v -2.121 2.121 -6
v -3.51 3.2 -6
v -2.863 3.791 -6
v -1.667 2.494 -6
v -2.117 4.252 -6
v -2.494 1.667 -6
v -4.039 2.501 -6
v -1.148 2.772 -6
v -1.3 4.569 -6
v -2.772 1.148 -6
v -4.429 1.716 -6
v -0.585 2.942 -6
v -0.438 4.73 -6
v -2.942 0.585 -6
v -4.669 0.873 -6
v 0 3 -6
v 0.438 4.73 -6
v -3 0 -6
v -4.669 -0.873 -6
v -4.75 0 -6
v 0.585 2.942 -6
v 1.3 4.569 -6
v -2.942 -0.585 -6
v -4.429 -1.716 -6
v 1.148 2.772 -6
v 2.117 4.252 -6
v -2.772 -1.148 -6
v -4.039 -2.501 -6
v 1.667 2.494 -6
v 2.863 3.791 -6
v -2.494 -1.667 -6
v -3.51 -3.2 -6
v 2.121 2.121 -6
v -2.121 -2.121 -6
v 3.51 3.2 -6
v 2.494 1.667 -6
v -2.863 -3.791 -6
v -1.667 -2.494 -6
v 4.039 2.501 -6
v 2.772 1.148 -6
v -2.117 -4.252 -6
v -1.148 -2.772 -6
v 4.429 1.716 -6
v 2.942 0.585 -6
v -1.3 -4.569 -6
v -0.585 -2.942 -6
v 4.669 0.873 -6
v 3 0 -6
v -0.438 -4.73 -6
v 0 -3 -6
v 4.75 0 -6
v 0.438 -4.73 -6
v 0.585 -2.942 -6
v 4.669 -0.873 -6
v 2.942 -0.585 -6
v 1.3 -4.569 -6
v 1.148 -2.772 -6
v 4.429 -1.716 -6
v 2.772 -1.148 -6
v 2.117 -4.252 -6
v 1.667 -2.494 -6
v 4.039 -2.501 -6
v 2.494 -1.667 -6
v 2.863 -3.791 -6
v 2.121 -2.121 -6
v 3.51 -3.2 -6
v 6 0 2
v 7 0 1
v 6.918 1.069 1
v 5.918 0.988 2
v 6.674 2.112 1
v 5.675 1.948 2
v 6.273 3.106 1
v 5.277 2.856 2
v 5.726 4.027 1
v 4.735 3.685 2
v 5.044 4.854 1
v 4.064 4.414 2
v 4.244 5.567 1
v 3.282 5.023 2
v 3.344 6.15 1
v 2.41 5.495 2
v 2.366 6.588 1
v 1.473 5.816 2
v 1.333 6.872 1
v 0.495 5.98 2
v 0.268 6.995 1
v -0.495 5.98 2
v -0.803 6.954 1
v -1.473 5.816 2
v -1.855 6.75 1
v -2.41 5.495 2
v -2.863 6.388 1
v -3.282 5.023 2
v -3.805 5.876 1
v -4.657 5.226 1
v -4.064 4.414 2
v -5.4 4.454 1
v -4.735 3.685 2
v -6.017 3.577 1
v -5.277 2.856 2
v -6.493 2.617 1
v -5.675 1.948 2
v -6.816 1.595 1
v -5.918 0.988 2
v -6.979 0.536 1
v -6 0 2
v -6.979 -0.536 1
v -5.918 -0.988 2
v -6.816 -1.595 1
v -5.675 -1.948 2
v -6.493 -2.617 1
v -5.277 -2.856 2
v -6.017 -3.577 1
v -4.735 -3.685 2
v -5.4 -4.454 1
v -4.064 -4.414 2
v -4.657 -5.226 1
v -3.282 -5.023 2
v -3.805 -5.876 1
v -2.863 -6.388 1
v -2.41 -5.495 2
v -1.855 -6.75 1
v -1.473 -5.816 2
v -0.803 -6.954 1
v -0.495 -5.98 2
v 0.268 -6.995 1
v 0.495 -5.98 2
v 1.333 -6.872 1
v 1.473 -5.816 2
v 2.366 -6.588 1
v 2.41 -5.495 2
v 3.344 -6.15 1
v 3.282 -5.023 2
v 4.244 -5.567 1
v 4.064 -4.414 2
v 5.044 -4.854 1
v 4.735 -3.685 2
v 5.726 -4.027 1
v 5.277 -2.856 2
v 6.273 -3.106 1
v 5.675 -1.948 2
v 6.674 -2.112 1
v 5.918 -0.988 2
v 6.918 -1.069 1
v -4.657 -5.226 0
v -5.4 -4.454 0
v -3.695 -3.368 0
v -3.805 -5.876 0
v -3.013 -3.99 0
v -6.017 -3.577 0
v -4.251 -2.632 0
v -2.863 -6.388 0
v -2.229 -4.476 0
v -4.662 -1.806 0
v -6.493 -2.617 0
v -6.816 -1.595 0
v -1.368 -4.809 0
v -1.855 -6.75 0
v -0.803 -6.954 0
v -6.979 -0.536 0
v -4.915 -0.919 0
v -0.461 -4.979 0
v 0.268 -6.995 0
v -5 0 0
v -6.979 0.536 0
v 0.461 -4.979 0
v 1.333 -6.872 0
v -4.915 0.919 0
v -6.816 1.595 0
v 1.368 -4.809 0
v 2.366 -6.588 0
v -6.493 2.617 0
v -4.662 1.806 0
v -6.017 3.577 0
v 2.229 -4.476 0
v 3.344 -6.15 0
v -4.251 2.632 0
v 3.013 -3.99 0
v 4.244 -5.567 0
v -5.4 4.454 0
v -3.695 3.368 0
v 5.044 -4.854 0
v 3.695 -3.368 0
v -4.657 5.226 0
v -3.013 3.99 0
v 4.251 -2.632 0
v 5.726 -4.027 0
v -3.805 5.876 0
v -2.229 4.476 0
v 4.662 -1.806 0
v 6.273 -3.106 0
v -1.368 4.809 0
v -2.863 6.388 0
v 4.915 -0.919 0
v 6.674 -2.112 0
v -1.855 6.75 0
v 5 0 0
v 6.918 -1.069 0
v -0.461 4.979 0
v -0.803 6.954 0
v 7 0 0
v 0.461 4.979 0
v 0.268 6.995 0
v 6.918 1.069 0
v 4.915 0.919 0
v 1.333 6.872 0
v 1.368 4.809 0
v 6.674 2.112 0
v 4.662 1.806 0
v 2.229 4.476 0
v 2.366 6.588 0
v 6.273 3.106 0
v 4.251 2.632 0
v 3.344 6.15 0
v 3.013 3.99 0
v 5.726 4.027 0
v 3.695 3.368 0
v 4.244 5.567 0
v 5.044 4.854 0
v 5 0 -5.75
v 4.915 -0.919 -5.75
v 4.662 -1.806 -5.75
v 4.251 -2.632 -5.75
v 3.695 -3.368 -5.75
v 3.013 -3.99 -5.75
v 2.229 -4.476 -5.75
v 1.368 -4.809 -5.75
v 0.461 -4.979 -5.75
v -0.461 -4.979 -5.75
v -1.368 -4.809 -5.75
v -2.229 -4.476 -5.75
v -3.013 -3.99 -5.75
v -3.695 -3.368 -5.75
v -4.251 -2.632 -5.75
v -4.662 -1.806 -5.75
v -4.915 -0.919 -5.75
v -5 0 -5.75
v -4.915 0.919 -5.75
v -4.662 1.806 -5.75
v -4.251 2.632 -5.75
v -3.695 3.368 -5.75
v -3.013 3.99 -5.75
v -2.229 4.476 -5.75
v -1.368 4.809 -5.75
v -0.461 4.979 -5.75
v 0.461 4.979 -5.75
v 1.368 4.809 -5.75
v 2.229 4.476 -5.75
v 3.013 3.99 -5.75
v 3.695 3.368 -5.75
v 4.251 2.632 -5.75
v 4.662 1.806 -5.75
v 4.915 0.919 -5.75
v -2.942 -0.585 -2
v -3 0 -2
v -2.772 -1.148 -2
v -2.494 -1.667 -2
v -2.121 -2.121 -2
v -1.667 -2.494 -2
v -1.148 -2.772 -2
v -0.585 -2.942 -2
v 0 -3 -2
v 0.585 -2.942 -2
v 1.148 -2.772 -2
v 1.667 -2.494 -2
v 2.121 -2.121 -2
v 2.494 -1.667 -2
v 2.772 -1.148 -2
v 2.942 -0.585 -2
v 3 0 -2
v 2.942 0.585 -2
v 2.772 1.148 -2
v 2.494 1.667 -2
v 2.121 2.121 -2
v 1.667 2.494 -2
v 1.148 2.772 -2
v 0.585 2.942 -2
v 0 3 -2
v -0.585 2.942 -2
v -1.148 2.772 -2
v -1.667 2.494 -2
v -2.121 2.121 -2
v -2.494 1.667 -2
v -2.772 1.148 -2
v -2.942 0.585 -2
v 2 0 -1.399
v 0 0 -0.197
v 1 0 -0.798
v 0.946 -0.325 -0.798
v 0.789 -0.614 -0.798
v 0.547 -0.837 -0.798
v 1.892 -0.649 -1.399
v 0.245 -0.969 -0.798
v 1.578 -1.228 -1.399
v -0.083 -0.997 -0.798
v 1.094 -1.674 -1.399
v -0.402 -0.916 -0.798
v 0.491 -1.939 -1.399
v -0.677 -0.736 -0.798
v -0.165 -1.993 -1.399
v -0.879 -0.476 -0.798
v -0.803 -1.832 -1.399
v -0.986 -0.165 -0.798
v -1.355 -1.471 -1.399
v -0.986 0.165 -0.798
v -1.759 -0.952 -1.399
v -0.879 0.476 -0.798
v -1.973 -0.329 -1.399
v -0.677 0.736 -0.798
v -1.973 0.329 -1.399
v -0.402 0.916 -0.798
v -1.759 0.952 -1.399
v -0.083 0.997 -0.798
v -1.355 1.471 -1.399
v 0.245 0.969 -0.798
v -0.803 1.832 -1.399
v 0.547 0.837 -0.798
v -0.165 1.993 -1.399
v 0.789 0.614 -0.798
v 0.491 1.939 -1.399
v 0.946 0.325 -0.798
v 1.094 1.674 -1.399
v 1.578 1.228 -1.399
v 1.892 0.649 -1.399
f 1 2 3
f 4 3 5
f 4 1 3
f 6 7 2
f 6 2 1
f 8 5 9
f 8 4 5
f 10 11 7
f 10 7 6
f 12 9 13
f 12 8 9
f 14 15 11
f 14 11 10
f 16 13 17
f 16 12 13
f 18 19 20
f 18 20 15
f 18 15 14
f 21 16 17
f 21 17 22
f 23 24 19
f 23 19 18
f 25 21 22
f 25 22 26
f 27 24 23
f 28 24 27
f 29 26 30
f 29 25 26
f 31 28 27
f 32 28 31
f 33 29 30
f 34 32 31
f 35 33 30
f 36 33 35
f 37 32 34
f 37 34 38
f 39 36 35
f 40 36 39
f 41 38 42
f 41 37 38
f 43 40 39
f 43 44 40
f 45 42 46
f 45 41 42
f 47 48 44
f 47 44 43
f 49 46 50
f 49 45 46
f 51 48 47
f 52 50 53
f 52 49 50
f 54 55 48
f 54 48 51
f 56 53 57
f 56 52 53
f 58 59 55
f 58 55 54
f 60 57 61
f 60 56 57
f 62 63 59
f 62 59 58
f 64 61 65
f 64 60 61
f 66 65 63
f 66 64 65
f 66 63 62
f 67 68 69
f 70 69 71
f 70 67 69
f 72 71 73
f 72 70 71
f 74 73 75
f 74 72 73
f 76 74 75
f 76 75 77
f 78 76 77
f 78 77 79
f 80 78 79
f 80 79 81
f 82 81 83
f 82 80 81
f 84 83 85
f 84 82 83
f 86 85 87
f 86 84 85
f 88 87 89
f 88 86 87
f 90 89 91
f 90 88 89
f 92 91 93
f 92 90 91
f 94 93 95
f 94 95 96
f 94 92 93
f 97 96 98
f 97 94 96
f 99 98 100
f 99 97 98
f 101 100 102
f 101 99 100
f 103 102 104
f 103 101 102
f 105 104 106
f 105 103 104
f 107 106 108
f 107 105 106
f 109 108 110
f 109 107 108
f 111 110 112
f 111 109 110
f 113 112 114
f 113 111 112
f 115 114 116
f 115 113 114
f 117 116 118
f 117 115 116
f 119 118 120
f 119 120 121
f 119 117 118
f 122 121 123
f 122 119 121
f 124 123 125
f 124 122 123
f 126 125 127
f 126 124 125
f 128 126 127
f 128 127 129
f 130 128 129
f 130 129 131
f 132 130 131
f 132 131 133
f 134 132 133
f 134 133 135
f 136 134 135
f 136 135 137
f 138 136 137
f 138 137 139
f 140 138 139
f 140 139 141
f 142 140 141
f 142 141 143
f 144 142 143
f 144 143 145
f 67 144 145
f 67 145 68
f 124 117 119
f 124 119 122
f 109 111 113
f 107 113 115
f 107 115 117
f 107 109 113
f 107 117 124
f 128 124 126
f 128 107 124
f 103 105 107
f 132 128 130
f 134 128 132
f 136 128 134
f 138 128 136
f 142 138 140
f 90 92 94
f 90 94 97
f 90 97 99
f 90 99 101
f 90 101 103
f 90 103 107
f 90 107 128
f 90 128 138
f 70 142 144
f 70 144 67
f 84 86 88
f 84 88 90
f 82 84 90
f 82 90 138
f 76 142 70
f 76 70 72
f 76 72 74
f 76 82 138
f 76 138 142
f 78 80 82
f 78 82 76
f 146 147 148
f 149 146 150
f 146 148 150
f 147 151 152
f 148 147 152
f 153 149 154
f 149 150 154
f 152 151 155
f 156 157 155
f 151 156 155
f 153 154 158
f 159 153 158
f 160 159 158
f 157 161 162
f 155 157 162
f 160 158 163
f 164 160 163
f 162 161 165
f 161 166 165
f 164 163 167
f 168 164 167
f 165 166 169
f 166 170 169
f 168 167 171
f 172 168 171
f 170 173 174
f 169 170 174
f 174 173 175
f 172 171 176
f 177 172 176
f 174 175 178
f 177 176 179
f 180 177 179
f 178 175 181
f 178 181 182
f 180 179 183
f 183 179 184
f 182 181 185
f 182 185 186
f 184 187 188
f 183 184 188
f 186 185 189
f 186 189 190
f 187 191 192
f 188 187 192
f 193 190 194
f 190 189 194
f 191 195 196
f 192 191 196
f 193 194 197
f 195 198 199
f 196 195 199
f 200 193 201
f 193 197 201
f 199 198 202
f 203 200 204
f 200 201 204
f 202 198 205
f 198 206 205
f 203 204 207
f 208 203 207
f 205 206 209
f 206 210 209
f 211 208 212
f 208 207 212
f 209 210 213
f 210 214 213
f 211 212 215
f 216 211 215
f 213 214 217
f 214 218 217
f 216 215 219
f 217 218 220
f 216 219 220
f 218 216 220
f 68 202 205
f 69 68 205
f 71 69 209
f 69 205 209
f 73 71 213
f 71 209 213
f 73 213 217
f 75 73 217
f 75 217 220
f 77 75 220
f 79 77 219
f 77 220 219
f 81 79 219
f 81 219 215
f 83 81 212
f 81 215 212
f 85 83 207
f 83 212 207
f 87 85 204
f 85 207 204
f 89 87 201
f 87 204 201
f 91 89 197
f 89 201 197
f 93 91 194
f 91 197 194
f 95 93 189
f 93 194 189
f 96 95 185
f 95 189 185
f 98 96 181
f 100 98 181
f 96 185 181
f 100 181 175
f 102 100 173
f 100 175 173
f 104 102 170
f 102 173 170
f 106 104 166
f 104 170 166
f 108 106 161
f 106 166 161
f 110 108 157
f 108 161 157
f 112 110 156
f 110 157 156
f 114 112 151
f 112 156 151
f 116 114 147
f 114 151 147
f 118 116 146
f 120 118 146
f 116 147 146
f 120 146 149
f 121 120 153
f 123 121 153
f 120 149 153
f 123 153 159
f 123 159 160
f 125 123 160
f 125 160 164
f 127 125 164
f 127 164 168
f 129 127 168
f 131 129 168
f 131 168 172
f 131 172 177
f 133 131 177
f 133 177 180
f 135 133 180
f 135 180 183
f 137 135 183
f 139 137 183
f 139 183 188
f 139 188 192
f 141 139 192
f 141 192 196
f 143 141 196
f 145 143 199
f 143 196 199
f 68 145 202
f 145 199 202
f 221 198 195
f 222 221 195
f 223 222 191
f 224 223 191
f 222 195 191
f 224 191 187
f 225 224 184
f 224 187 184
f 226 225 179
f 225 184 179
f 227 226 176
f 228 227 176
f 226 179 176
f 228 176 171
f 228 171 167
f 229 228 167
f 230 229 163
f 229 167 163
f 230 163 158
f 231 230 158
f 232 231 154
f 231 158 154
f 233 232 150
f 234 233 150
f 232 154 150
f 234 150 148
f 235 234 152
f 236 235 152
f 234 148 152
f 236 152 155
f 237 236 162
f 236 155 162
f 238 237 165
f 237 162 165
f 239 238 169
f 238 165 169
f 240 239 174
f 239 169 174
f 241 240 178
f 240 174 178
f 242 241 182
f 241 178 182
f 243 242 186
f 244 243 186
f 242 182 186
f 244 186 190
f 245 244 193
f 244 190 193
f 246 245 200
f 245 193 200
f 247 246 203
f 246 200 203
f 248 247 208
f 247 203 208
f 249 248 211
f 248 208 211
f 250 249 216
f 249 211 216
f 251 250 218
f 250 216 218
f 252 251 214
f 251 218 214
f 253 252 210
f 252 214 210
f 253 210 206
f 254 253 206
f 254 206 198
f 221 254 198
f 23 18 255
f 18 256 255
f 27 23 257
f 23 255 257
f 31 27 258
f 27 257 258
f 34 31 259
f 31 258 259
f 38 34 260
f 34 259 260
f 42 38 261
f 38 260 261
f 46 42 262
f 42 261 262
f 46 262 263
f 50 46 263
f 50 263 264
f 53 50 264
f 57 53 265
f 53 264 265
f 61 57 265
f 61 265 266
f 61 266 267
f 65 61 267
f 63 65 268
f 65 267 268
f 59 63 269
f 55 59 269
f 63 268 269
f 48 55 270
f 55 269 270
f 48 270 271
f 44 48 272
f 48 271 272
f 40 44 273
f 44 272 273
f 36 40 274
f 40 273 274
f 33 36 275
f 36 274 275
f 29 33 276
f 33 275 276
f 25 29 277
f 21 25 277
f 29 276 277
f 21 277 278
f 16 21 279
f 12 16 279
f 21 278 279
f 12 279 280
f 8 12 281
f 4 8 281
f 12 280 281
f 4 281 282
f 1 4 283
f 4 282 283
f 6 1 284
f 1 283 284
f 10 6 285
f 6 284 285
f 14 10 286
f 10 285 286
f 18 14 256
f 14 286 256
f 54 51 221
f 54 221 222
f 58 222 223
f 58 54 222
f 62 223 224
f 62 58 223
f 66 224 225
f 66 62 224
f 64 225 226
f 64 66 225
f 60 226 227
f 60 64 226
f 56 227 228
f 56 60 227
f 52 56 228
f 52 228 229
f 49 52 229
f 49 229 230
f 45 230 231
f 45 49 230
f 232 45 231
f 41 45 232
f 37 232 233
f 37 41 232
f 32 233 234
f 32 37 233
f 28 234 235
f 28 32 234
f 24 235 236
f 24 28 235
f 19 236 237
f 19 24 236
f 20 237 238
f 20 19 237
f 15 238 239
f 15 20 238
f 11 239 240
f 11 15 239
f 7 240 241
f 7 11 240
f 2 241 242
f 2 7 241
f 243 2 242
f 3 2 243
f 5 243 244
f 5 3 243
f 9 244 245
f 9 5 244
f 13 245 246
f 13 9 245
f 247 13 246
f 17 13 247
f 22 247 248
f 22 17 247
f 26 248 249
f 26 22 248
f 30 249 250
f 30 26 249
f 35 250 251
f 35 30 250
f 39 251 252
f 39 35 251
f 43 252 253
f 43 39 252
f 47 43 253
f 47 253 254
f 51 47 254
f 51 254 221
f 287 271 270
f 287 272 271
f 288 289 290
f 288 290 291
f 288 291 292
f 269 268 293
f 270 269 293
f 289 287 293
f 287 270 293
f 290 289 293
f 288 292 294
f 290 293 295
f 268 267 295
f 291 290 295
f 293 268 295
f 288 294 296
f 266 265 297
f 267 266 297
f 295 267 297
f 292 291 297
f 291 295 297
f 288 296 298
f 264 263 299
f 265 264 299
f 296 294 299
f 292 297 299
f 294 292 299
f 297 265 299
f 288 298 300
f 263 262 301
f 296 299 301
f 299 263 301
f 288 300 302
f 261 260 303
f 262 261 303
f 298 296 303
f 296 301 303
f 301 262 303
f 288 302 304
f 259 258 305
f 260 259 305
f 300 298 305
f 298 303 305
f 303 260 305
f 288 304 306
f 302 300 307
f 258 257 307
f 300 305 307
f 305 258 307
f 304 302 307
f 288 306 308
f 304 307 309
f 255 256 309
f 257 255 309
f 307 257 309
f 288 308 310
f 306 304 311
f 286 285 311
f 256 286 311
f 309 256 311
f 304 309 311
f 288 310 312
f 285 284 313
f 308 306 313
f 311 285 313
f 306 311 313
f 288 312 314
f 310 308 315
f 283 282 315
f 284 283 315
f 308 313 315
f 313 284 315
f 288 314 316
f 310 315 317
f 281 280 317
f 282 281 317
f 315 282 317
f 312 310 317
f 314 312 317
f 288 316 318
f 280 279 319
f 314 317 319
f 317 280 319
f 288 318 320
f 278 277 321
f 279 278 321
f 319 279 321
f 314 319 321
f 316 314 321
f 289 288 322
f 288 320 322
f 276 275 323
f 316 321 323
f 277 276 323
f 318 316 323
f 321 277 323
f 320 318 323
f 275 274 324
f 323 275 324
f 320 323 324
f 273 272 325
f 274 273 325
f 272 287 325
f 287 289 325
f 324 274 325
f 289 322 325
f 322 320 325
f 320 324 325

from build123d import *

# Parameters (mm, degrees)
F0_R     = 7
F1_DEPTH = 2
F2_SIZE  = 1
F3_R     = 5
F4_DEPTH = 6
F5_SIZE  = 0.25
F7_D     = 6
F7_DEPTH = 4
F7_TIP   = 1.8025818571


with BuildPart() as f1:
    # F0 (on Top) → F1 (new body)
    with BuildSketch(Plane.XY):
        Circle(F0_R)
    extrude(amount=F1_DEPTH)

    # F2
    f2_edges = [f1.edges().sort_by_distance(p)[0] for p in [
        (-7, 0, 2),
    ]]
    chamfer(f2_edges, length=F2_SIZE)

    # F3 (on face) → F4 (join)
    with BuildSketch(Plane(origin=(0, 0, 0), x_dir=(1, 0, 0), z_dir=(0, 0, -1))):
        Circle(F3_R)
    extrude(amount=F4_DEPTH)

    # F5
    f5_edges = [f1.edges().sort_by_distance(p)[0] for p in [
        (-5, 0, -6),
    ]]
    chamfer(f5_edges, length=F5_SIZE)

    # F7
    with Locations(Plane(origin=(0, 0, -6), x_dir=(1, 0, 0), z_dir=(0, 0, -1))):
        with Locations((0, 0)):
            Hole(F7_D / 2, depth=F7_DEPTH)
            with Locations((0, 0, -(F7_DEPTH + F7_TIP / 2))):  # 118° drill point
                Cone(0, F7_D / 2, F7_TIP, mode=Mode.SUBTRACT)


solid = f1.part
